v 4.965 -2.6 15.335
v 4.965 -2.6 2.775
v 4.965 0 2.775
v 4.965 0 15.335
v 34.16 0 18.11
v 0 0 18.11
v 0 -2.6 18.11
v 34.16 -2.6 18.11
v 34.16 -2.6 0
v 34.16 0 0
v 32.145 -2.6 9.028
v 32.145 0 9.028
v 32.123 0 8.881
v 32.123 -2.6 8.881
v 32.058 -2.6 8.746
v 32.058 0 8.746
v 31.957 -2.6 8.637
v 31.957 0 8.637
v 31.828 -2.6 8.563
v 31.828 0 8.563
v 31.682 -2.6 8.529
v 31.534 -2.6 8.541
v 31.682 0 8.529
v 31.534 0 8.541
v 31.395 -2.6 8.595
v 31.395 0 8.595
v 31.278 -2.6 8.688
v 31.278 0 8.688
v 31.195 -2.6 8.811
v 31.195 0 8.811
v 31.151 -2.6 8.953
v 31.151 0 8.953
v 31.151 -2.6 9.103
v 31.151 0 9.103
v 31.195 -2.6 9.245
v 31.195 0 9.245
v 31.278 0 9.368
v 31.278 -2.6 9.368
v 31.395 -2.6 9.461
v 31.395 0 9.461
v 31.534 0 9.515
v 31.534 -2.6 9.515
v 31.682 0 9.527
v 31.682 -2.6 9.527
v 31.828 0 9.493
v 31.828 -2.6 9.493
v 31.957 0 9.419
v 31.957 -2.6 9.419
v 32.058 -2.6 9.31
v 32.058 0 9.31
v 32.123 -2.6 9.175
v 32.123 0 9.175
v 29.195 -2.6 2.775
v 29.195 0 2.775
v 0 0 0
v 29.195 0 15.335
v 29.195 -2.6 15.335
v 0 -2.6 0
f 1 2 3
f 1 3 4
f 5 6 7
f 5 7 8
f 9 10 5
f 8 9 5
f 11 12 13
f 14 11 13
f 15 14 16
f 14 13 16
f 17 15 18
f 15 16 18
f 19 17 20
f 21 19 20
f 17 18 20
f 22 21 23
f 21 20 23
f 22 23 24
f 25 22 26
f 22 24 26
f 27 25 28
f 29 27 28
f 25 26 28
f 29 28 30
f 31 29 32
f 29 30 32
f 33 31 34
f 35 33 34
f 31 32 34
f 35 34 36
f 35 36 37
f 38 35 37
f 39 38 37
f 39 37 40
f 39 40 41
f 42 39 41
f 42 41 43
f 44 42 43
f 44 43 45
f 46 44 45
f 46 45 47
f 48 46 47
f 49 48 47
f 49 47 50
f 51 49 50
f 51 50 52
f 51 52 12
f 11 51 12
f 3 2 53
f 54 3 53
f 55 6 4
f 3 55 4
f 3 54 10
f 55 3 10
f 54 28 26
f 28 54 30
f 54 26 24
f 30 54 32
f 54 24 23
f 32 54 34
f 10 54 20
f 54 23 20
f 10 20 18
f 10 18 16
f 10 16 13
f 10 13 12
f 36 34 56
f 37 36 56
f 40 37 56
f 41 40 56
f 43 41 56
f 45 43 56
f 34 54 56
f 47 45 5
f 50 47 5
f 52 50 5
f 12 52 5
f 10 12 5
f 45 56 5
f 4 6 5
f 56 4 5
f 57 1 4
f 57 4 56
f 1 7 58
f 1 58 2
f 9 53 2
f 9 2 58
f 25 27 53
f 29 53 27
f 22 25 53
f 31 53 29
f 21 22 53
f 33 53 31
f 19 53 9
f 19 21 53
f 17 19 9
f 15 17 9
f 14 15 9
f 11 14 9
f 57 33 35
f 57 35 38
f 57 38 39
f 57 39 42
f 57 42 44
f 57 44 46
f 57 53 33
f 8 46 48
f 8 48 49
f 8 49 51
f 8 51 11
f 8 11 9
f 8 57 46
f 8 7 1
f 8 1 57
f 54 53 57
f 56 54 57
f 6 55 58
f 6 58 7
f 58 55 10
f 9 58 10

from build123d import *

# Parameters (mm, degrees)
SKETCH_W        = 34.16
SKETCH_H        = 18.11
PAD_DEPTH       = 2.6
SKETCH002_W     = 24.23
SKETCH002_H     = 12.56
POCKET_DEPTH    = 2.6
SKETCH003_R     = 0.5
SKETCH003_W     = 2.01
SKETCH003_H     = 3.5
POCKET001_DEPTH = 5


with BuildPart() as part:
    # Sketch → Pad (new body)
    with BuildSketch(Plane.XZ):
        with Locations((17.08, 9.055)):
            Rectangle(SKETCH_W, SKETCH_H)
    extrude(amount=PAD_DEPTH)

    # Sketch002 (on Face6 of Pad) → Pocket (cut)
    with BuildSketch(Plane.XZ.offset(2.6)):
        with Locations((17.08, 9.055)):
            Rectangle(SKETCH002_W, SKETCH002_H)
    extrude(amount=-POCKET_DEPTH, mode=Mode.SUBTRACT)

    # Sketch003 (on Face4 of Pocket) → Pocket001 (cut)
    with BuildSketch(Plane(origin=(0, 0, 0), x_dir=(1, 0, 0), z_dir=(0, 1, 0))):
        with Locations((31.645, -9.028)):
            Circle(SKETCH003_R)
        with Locations((27.953742, -8.544061)):
            Rectangle(SKETCH003_W, SKETCH003_H)
    extrude(amount=-POCKET001_DEPTH, mode=Mode.SUBTRACT)


solid = part.part
